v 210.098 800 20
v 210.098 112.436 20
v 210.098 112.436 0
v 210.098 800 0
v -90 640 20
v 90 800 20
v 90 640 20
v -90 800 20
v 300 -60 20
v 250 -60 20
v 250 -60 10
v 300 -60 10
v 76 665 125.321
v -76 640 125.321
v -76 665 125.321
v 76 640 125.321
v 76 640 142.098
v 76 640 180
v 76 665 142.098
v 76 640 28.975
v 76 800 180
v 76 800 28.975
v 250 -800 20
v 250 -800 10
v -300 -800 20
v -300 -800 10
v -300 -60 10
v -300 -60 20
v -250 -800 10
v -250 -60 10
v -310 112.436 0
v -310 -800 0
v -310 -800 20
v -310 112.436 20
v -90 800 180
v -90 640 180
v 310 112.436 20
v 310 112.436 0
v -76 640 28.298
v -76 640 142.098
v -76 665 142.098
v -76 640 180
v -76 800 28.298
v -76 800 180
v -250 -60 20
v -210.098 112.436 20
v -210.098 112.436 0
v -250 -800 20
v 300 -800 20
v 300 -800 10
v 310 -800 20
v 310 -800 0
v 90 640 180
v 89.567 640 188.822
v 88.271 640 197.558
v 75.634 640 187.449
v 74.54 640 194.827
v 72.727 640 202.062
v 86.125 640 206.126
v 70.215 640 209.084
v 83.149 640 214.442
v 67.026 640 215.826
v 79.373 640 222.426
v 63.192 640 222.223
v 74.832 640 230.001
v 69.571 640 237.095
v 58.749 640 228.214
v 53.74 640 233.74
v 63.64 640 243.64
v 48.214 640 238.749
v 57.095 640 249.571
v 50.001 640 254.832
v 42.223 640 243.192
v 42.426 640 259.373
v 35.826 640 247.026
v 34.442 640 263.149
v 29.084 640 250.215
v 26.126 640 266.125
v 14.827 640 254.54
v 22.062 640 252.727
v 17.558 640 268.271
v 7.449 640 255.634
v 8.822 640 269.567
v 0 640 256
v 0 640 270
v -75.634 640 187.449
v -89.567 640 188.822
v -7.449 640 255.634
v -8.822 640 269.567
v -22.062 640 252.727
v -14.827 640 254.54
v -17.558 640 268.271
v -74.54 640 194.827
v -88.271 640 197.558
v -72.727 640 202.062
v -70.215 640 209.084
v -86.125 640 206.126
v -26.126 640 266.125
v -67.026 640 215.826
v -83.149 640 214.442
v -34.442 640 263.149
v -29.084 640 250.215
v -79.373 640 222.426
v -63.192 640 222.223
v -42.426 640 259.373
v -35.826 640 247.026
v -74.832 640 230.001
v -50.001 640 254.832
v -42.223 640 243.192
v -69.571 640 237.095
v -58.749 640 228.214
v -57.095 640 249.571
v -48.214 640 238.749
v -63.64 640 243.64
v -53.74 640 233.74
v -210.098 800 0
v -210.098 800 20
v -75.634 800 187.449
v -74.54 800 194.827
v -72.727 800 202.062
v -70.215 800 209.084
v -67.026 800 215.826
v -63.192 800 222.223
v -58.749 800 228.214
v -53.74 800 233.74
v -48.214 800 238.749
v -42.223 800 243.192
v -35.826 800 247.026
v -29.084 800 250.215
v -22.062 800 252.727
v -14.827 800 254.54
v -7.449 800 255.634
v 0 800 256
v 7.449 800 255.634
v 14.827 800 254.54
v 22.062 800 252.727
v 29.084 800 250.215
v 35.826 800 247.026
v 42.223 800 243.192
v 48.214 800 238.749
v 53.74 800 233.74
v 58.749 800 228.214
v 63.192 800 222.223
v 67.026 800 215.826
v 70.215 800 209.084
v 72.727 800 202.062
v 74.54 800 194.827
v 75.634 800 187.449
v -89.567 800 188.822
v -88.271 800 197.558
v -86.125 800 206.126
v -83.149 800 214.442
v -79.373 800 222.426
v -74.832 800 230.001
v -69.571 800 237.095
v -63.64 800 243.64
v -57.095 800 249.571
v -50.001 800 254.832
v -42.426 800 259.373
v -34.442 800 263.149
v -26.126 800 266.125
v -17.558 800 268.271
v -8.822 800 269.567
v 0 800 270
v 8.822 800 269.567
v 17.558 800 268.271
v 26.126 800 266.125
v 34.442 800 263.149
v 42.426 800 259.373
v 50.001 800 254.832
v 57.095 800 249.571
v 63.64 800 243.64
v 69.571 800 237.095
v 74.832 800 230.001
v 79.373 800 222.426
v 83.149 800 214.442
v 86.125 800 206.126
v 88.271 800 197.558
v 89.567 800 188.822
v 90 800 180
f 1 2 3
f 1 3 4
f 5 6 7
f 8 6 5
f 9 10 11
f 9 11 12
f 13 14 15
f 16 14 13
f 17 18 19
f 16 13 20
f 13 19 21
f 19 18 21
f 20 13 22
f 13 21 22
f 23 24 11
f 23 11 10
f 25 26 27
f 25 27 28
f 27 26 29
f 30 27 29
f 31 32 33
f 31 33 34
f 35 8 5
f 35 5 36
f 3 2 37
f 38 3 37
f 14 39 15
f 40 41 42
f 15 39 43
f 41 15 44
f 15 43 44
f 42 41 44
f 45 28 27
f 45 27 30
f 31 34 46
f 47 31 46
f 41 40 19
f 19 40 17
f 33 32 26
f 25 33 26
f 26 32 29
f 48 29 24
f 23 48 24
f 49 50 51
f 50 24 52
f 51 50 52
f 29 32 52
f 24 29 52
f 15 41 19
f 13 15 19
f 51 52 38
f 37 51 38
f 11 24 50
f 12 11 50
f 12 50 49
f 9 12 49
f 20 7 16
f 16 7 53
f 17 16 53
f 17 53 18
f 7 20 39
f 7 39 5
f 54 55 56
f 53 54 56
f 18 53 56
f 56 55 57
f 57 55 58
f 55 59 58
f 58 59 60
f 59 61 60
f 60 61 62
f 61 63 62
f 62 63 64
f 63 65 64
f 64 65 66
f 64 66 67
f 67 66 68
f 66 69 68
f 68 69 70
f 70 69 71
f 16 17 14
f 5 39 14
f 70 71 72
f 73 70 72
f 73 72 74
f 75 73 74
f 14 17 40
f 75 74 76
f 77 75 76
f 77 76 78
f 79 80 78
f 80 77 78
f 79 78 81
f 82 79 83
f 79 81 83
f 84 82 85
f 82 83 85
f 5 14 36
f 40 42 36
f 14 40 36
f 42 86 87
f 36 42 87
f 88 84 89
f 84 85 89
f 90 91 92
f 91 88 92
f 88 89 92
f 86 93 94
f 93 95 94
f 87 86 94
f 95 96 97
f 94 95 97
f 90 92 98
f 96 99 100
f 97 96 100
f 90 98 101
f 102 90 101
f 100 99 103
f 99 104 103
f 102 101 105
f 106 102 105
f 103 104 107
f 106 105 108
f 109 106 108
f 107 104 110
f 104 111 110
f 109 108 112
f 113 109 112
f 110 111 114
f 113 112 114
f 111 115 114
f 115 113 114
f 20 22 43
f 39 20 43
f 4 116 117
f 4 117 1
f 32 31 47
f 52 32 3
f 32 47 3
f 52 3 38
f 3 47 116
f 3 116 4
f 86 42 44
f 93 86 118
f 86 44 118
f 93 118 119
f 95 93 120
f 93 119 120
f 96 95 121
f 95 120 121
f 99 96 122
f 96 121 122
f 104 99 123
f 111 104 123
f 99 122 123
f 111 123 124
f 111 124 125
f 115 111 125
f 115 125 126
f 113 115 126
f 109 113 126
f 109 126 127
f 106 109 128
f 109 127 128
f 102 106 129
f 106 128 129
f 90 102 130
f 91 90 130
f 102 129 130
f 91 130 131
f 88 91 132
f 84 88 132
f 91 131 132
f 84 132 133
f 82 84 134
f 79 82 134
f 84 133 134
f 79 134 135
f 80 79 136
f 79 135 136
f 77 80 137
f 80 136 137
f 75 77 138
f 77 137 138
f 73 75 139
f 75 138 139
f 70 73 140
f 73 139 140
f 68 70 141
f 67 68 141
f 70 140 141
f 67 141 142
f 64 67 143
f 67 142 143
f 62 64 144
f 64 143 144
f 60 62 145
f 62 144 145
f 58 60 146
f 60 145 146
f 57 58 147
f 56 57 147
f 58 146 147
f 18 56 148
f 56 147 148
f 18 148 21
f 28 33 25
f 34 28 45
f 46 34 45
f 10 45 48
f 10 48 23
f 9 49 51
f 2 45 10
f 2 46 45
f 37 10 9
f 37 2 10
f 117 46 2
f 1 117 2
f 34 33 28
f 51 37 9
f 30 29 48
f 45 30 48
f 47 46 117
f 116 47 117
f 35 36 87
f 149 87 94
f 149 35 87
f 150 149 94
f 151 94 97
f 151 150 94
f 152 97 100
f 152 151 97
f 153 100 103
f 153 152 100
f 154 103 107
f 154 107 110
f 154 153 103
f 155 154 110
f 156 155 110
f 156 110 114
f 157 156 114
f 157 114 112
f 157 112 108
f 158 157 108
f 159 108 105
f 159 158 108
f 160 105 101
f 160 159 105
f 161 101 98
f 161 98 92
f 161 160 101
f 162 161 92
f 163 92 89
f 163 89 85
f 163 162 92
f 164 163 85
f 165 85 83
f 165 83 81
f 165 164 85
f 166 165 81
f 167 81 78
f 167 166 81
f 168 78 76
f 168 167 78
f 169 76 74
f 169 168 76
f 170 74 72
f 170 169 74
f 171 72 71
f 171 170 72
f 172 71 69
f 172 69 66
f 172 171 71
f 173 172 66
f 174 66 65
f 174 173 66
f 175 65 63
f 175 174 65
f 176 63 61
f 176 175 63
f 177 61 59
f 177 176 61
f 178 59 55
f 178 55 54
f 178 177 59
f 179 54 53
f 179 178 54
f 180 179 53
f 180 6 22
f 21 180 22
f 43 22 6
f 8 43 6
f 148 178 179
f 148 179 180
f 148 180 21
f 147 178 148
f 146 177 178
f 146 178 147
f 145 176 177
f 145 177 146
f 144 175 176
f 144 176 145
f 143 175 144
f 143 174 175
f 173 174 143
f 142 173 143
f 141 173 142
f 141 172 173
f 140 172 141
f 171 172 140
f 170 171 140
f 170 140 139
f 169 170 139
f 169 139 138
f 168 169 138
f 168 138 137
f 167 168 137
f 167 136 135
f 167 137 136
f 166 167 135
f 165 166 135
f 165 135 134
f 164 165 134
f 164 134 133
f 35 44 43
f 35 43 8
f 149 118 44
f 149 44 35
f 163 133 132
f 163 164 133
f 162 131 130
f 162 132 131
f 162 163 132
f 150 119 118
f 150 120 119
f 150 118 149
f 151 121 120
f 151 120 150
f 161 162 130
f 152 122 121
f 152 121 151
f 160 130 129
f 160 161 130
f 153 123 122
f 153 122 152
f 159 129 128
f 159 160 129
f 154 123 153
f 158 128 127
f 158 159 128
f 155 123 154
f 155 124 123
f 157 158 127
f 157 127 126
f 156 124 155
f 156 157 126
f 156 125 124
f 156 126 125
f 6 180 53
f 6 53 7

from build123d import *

# Parameters (mm, degrees)
F0_W      = 620
F0_H      = 1600
F1_DEPTH  = 20
F2_W      = 50
F2_H      = 10
F3_DEPTH  = 740
F4_W      = 99.9023592472
F4_H      = 687.5636011362
F5_DEPTH  = 20.001
F7_DEPTH  = 160
F9_DEPTH  = 160
F10_W     = 152.0000243187
F10_H     = 16.7765766382
F11_DEPTH = 25


with BuildPart() as f1:
    # F0 (on Top) → F1 (new body)
    with BuildSketch(Plane.XY):
        Rectangle(F0_W, F0_H)
    extrude(amount=F1_DEPTH)

    # F2 (on face) → F3 (cut)
    with BuildSketch(Plane.XZ.offset(800)):
        with Locations((-275, 15)):
            Rectangle(F2_W, F2_H)
        with Locations((275, 15)):
            Rectangle(F2_W, F2_H)
    extrude(amount=-F3_DEPTH, mode=Mode.SUBTRACT)

    # F4 (on face) → F5 (cut, through all)
    with BuildSketch(Plane.XY.offset(20)):
        with Locations((-260.0488203764, 456.2181994319)):
            Rectangle(F4_W, F4_H)
        with Locations((260.0488203764, 456.2181994319)):
            Rectangle(F4_W, F4_H)
    extrude(amount=-F5_DEPTH, mode=Mode.SUBTRACT)


with BuildPart() as f7:
    # F6 (on face) → F7 (new body)
    with BuildSketch(Plane(origin=(0, 800, 0), x_dir=(-1, 0, 0), z_dir=(0, 1, 0))):
        with BuildLine():
            Line((0, 180), (90, 180))
            ThreePointArc((90, 180), (0, 270), (-90, 180))
            Line((-90, 180), (0, 180))
        make_face()
        with BuildLine():
            Line((90, 20), (90, 180))
            ThreePointArc((90, 180), (63.6396103068, 116.3603896932), (0, 90))
            Line((0, 90), (0, 20))
            Line((0, 20), (90, 20))
        make_face()
        with BuildLine():
            ThreePointArc((0, 90), (63.6396103068, 116.3603896932), (90, 180))
            Line((90, 180), (0, 180))
            Line((0, 180), (0, 90))
        make_face()
        with BuildLine():
            Line((0, 180), (-90, 180))
            ThreePointArc((-90, 180), (-63.6396103068, 116.3603896932), (0, 90))
            Line((0, 90), (0, 180))
        make_face()
        with BuildLine():
            ThreePointArc((0, 90), (-63.6396103068, 116.3603896932), (-90, 180))
            Line((-90, 180), (-90, 20))
            Line((-90, 20), (0, 20))
            Line((0, 20), (0, 90))
        make_face()
    extrude(amount=-F7_DEPTH)

    # F8 (on face) → F9 (cut, through all)
    with BuildSketch(Plane(origin=(0, 800, 0), x_dir=(-1, 0, 0), z_dir=(0, 1, 0))):
        with BuildLine():
            Line((-76.0000121593, 180), (-76.0000121593, 28.9745684713))
            Line((-76.0000121593, 28.9745684713), (76.0000121593, 28.2976105809))
            Line((76.0000121593, 28.2976105809), (76.0000121593, 180))
            ThreePointArc((76.0000121593, 180), (0, 256.0000121593), (-76.0000121593, 180))
        make_face()
    extrude(amount=-F9_DEPTH, mode=Mode.SUBTRACT)

    # F10 (on face) → F11 (join)
    with BuildSketch(Plane.XZ.offset(-640)):
        with Locations((0, 133.7094679475)):
            Rectangle(F10_W, F10_H)
    extrude(amount=-F11_DEPTH)


solid = Compound([f1.part, f7.part])
